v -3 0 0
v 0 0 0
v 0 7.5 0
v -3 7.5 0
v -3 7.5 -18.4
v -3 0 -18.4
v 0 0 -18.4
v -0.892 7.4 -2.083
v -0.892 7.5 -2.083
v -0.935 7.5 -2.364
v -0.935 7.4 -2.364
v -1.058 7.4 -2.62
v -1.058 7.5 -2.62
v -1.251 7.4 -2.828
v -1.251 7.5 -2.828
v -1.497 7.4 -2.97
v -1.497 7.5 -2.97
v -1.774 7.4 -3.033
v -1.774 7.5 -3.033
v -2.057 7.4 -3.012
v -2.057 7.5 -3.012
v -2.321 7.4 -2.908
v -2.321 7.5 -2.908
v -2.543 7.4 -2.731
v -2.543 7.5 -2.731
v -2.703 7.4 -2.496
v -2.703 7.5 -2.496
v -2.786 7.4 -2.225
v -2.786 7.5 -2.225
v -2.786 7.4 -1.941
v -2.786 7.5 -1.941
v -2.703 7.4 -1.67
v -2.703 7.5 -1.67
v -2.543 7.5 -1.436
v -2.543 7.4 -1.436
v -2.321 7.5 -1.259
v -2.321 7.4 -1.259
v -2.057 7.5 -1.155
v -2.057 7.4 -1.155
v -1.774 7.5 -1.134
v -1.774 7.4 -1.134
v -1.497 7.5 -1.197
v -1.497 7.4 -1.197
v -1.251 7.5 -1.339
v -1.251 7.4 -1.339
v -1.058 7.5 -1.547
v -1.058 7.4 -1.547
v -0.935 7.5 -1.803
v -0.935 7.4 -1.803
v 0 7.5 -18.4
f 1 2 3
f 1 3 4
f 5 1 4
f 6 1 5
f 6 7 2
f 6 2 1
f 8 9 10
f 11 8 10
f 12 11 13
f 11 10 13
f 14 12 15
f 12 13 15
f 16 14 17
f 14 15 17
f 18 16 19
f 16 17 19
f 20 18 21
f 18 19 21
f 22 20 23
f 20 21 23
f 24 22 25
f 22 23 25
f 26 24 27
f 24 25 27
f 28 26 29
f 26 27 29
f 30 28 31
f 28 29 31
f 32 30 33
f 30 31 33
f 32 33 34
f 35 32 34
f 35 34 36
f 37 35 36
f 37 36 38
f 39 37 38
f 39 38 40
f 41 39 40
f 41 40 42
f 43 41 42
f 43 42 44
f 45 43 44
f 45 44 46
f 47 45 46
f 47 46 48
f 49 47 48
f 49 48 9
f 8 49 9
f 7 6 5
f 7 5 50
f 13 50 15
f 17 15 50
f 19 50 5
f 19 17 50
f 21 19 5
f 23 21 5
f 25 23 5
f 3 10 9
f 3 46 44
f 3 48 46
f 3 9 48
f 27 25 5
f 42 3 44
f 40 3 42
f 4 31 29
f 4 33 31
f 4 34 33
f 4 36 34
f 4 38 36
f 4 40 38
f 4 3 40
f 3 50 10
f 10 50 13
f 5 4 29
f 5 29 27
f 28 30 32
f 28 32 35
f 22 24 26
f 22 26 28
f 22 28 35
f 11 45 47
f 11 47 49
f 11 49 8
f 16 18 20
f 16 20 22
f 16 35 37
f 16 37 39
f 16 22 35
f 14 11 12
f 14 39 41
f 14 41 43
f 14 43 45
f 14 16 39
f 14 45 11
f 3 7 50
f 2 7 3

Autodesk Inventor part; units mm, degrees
ref_plane "YZ Plane" through (0, 0, 0) normal (1, 0, 0) x (0, 1, 0)
ref_plane "XZ Plane" through (0, 0, 0) normal (0, 1, 0) x (-1, 0, 0)
ref_plane "XY Plane" through (0, 0, 0) normal (0, 0, 1) x (1, 0, 0)
sketch "Sketch1" plane through (0, 0, 0) normal (0, 1, 0) x (-1, 0, 0)
  line L0 (0, 0) -> (3, 0)
  line L1 (3, 0) -> (3, -18.4)
  line L2 (3, -18.4) -> (0, -18.4)
  line L3 (0, -18.4) -> (0, 0)
  dimension "d0" = 3
  dimension "d1" = 18.4
extrude "Extrusion1" add sketch "Sketch1" along normal blind 7.5
sketch "Sketch2" plane through (0, 7.5, 0) normal (0, 1, 0) x (1, 0, 0)
  circle A0 centre (-1.8447, 2.0833) radius 0.9523
  point P0 (0, 0)
extrude "Extrusion2" cut sketch "Sketch2" against normal blind 0.1
properties part number "backside"
